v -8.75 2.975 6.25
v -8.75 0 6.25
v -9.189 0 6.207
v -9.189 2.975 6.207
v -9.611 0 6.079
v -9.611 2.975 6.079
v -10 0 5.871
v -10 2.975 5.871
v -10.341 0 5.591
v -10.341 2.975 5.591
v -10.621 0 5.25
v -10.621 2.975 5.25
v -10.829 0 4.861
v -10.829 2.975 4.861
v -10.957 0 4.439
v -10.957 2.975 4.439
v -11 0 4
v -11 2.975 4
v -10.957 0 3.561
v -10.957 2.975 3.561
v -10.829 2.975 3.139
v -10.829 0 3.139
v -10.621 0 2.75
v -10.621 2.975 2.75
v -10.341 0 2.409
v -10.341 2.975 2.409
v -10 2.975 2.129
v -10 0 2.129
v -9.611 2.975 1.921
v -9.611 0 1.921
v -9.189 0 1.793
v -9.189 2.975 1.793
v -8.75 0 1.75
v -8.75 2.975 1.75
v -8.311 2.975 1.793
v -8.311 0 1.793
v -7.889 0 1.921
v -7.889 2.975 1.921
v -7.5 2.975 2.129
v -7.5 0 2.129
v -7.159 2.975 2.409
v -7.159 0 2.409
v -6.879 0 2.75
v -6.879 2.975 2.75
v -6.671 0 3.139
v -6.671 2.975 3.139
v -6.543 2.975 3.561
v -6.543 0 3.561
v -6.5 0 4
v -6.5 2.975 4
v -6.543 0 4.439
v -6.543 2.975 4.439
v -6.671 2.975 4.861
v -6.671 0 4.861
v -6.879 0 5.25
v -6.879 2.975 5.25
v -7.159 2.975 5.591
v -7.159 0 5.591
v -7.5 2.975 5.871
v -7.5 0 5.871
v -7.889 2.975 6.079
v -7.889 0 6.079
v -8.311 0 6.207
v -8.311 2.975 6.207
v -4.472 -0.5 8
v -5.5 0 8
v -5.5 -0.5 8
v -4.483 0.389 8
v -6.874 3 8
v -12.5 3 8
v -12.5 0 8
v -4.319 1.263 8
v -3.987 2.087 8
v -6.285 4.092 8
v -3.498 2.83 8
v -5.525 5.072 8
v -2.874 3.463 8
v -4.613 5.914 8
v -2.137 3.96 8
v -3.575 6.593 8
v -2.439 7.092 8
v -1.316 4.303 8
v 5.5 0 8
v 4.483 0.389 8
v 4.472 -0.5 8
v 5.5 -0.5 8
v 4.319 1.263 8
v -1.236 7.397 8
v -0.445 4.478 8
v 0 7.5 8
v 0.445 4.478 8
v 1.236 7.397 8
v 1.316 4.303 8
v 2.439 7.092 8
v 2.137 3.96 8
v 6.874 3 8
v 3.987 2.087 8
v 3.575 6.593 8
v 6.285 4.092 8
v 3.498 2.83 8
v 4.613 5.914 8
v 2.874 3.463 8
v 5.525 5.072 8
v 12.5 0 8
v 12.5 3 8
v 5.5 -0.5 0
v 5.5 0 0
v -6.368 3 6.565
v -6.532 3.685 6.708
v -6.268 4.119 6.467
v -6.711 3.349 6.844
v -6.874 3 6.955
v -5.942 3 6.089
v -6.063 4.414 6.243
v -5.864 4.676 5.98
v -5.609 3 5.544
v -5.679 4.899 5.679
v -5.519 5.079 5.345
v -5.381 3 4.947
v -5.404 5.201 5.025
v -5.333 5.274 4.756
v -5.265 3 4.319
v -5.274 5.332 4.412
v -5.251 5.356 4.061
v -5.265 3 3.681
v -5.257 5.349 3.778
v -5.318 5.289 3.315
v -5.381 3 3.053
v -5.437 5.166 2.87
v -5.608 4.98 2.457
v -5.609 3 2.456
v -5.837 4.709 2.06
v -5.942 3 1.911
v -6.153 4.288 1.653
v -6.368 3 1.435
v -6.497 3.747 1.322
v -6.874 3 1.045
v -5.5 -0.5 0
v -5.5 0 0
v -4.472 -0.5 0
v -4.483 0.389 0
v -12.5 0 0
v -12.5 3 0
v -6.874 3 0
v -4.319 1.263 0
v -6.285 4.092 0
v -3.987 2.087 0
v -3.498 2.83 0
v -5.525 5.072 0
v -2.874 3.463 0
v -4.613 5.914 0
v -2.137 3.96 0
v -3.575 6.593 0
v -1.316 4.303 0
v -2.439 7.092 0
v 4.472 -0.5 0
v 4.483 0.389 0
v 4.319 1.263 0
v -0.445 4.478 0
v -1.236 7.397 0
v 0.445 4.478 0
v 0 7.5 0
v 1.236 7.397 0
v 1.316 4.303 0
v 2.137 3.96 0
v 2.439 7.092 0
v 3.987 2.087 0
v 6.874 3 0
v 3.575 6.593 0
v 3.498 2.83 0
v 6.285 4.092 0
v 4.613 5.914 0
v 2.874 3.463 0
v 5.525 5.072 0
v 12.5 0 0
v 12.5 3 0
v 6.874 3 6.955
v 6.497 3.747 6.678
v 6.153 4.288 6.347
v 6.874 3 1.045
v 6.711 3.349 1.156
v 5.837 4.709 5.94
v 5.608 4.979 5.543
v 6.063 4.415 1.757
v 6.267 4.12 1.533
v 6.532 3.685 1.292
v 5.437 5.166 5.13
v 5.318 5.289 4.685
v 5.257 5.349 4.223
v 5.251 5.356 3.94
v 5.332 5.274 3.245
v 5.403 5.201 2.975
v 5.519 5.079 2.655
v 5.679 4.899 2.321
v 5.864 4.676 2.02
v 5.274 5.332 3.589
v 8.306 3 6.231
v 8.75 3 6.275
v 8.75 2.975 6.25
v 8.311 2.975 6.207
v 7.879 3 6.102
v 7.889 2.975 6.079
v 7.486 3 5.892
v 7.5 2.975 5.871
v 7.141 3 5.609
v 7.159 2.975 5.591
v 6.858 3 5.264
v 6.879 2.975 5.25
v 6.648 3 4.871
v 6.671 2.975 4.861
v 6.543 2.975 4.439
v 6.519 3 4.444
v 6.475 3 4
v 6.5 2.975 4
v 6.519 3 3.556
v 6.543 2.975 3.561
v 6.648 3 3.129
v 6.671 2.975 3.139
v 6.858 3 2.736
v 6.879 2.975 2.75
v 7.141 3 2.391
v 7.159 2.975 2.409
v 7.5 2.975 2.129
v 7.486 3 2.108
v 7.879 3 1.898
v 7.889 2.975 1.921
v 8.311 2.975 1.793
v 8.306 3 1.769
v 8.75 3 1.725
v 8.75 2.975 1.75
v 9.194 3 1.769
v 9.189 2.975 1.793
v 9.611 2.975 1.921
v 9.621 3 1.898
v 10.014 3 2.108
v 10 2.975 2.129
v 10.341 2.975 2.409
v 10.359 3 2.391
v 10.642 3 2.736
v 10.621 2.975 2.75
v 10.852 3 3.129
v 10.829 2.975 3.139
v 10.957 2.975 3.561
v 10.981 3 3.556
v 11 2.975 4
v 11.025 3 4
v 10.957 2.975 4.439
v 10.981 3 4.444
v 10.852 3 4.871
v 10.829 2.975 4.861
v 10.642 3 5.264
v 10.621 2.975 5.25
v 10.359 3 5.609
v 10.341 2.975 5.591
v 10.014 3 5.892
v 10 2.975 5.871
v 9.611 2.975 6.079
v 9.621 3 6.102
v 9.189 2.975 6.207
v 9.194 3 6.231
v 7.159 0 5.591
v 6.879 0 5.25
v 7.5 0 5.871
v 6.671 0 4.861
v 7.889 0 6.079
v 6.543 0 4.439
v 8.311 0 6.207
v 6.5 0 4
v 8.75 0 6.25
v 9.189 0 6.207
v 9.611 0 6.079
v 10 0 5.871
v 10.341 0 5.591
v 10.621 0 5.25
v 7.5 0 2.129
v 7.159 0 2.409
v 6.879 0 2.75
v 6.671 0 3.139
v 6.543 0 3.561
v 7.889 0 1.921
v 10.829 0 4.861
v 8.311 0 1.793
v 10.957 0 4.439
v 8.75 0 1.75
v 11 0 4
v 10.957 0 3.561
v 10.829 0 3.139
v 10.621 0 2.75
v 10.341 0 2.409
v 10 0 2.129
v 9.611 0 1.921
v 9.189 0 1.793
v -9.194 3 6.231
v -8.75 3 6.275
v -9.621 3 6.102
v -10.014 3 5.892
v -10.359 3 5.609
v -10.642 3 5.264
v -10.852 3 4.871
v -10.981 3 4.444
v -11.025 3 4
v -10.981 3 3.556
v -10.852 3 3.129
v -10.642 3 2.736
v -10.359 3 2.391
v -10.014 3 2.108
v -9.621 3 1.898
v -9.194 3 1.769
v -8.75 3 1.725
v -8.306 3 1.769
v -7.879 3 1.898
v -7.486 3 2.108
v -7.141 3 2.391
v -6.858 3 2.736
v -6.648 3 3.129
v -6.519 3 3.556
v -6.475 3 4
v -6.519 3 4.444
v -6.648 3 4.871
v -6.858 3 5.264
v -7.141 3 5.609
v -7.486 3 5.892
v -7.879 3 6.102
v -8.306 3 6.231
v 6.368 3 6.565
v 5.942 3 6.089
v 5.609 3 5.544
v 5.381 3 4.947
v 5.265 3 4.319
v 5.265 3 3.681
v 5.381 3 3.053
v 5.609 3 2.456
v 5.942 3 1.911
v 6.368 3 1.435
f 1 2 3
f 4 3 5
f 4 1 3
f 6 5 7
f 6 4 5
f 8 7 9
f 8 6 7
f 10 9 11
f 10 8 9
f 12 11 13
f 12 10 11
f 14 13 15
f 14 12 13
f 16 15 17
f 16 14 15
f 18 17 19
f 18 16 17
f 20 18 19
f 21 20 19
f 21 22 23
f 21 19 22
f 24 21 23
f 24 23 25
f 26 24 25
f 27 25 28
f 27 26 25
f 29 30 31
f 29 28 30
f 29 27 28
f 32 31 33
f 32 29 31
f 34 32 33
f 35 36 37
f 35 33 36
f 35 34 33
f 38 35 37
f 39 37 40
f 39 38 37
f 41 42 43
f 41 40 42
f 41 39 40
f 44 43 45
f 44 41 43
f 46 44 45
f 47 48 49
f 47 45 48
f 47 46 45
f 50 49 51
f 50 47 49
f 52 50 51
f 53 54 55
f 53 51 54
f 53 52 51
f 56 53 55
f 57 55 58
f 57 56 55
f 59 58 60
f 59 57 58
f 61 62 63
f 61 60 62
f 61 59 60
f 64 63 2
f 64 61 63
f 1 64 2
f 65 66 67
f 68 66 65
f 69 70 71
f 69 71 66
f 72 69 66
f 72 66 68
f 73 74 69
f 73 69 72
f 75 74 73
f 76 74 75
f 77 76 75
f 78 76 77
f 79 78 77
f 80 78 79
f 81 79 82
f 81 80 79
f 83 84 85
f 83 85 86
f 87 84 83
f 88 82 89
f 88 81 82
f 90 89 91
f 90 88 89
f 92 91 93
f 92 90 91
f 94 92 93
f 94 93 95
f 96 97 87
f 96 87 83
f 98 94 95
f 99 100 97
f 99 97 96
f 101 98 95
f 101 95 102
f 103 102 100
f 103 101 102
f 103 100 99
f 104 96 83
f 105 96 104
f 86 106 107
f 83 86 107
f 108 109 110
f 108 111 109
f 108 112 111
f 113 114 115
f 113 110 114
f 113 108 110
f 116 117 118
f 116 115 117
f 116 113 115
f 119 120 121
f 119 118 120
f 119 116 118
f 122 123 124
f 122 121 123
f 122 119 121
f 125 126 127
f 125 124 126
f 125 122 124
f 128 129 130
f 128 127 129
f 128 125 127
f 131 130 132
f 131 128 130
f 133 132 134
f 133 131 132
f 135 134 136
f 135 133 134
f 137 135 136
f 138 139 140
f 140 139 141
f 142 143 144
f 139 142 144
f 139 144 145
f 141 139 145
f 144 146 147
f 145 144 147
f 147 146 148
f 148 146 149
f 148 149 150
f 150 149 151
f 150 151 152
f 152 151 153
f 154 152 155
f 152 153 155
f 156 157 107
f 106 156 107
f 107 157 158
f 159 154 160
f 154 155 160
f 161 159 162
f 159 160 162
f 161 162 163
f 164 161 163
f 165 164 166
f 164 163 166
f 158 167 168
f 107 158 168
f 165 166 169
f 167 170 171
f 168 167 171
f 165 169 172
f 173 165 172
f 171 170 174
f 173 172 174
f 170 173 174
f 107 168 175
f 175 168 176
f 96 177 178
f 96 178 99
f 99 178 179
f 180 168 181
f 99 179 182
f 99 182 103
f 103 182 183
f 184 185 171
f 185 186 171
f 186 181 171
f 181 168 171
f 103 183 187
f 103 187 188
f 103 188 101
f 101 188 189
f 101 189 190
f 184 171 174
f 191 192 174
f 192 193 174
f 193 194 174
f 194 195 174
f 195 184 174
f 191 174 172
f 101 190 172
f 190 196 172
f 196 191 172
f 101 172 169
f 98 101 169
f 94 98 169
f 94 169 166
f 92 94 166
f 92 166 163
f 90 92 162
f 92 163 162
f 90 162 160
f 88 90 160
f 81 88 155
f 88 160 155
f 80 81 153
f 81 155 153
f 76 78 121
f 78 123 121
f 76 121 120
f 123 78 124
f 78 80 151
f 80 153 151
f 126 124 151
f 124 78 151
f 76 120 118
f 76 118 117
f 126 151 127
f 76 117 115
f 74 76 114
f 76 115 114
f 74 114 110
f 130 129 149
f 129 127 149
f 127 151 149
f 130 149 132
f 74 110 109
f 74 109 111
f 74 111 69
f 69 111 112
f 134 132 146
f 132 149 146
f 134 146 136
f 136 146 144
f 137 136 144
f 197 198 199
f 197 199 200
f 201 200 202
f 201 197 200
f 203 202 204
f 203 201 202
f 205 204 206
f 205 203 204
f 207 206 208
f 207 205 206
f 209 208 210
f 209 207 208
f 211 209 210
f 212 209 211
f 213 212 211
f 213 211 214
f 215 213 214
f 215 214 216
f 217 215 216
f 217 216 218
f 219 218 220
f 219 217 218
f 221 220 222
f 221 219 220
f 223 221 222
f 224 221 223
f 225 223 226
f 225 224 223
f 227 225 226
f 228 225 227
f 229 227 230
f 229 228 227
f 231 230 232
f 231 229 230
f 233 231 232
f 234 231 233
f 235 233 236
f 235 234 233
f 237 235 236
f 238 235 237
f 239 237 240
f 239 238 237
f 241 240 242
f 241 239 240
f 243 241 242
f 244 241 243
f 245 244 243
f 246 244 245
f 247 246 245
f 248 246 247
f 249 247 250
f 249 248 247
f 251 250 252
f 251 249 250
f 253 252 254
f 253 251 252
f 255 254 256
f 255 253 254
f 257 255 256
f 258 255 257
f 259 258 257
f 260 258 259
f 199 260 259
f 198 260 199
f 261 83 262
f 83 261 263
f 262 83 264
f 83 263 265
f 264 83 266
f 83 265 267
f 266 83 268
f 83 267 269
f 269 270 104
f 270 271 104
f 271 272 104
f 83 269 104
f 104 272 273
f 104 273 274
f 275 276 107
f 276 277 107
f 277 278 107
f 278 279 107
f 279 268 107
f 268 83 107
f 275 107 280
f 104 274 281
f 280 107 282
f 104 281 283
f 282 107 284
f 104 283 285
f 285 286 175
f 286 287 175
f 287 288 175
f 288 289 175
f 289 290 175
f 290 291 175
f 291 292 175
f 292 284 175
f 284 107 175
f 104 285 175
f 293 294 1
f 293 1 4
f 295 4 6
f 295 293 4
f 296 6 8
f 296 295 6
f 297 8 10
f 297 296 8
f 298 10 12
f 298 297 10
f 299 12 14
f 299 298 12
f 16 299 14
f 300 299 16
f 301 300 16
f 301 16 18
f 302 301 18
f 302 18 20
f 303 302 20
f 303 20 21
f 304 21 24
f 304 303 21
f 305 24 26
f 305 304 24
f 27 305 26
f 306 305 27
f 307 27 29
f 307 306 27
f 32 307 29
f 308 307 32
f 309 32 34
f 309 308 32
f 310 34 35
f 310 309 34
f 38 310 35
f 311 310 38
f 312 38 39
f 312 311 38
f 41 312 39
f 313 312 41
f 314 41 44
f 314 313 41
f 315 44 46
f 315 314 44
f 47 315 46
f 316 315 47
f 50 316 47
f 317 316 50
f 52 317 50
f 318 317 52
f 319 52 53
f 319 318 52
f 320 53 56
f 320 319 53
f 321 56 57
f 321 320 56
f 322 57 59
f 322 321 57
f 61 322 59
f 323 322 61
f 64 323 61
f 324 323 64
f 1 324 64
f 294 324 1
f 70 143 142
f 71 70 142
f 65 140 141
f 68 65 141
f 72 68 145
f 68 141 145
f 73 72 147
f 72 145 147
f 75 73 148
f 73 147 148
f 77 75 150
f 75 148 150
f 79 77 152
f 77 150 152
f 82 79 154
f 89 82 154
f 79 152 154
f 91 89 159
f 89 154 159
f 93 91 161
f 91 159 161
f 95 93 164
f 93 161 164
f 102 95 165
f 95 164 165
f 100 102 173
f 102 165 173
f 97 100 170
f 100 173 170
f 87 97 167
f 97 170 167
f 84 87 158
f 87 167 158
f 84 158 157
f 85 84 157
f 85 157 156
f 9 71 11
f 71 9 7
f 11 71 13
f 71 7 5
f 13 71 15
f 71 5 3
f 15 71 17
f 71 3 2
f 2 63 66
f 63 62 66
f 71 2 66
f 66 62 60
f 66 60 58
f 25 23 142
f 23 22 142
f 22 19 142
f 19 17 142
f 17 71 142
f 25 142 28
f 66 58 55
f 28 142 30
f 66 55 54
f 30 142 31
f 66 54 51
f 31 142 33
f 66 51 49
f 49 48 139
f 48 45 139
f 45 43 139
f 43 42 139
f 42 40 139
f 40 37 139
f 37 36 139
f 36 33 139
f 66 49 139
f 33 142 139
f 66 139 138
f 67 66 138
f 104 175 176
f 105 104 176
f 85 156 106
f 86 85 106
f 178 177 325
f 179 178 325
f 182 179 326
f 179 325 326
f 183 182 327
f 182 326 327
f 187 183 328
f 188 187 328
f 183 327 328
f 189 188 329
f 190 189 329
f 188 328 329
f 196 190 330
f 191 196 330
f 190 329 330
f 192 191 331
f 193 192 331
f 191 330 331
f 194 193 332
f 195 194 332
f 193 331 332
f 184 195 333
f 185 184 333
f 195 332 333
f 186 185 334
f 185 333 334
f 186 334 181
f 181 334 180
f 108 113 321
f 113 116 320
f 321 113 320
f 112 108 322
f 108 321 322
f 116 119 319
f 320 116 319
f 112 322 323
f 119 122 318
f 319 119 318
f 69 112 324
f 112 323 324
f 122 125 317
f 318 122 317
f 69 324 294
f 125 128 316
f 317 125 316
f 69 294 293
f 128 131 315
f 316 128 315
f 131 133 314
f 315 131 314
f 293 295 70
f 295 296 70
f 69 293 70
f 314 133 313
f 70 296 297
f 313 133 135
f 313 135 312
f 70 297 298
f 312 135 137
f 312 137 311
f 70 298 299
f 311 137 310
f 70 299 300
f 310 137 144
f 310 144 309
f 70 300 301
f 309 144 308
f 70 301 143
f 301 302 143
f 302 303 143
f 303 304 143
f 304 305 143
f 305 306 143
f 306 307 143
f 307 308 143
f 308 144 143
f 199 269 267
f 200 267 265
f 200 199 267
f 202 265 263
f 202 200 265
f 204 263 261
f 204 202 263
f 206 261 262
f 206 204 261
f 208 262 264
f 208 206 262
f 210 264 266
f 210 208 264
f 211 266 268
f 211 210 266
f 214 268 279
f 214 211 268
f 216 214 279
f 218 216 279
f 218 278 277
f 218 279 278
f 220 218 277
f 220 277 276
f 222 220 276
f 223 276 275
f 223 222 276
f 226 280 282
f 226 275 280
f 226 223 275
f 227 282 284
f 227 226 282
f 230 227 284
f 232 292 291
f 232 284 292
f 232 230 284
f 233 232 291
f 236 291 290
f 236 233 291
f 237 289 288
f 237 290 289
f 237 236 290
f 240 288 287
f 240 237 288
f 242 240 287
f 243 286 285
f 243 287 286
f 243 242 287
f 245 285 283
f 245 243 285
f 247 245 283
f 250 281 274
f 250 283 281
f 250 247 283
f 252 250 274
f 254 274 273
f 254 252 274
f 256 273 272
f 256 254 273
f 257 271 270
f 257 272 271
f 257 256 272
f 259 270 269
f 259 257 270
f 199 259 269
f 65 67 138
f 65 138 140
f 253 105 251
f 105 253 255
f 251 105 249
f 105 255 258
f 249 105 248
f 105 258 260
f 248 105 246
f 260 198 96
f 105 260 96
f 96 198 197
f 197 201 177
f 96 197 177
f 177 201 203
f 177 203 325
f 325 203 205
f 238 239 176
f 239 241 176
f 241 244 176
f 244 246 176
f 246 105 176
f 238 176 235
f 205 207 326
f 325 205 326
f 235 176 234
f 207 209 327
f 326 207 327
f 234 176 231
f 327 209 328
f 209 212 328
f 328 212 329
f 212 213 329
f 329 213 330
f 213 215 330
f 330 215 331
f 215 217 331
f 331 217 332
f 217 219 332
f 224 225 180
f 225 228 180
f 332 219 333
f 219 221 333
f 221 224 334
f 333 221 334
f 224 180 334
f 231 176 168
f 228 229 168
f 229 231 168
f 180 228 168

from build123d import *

# Parameters (mm, degrees)
EXTRUDE_1_DEPTH             = 8
HOLE_WIZARD_M4_1_AT_2_COUNT = 2
HOLE_WIZARD_M4_1_AT_2_PITCH = 17.5
EXTRUDE_START               = -4
EXTRUDE_3_DEPTH             = 4
SKETCH_7_R                  = 4.5
CUT_EXTRUDE_1_DEPTH         = 1
SKETCH_8_R                  = 3.5
CUT_EXTRUDE_2_DEPTH         = 10
SKETCH_10_R                 = 4.5
CUT_EXTRUDE_3_DEPTH         = 17.170961718


with BuildPart() as part:
    # 草图1 → 凸台-拉伸1 (new body)
    with BuildSketch(Plane.XY):
        with BuildLine():
            Line((5.5, 0), (12.5, 0))
            Line((12.5, 0), (12.5, 3))
            Line((12.5, 3), (6.873863542, 3))
            ThreePointArc((6.873863542, 3), (0, 7.5), (-6.873863542, 3))
            Line((-6.873863542, 3), (-12.5, 3))
            Line((-12.5, 3), (-12.5, 0))
            Line((-12.5, 0), (-5.5, 0))
            Line((-5.5, 0), (-5.5, -0.5))
            Line((-5.5, -0.5), (-4.00894001, -0.5))
            ThreePointArc((-4.00894001, -0.5), (0, 4.04), (4.00894001, -0.5))
            Line((4.00894001, -0.5), (5.5, -0.5))
            Line((5.5, -0.5), (5.5, 0))
        make_face()
    extrude(amount=EXTRUDE_1_DEPTH)

    # 草图5 → M4 间隙孔1 (revolve, cut)
    with BuildSketch(Plane(origin=(-8.75, 3, 4), x_dir=(0, 0, 1), z_dir=(1, 0, 0))):
        Polygon((0, 0), (0, 4.501936393), (2.25, 3.15), (2.25, 0.025), (2.275, 0), align=None)
    hole_wizard_m4_1 = revolve(axis=Axis((-8.75, 9.35, 4), (0, -1, 0)), mode=Mode.SUBTRACT)

    # M4 间隙孔1 at 2: M4 间隙孔1 ×2
    with Locations(*[(i * HOLE_WIZARD_M4_1_AT_2_PITCH, 0, 0) for i in range(1, HOLE_WIZARD_M4_1_AT_2_COUNT)]):
        add(hole_wizard_m4_1, mode=Mode.SUBTRACT)

    # 草图6 → 凸台-拉伸3 (add)
    with BuildSketch(Plane.XY.offset(8).offset(EXTRUDE_START)):
        with BuildLine():
            Line((-4.00894001, -0.5), (-3.464101615, -0.5))
            ThreePointArc((-3.464101615, -0.5), (0, 3.5), (3.464101615, -0.5))
            Line((3.464101615, -0.5), (4.00894001, -0.5))
            ThreePointArc((4.00894001, -0.5), (0, 4.04), (-4.00894001, -0.5))
        make_face()
    extrude(amount=EXTRUDE_3_DEPTH)

    # 草图7 → 切除-拉伸1 (cut)
    with BuildSketch(Plane(origin=(0, 0, 0), x_dir=(-1, 0, 0), z_dir=(0, 0, -1))):
        Circle(SKETCH_7_R)
    extrude(amount=-CUT_EXTRUDE_1_DEPTH, mode=Mode.SUBTRACT)

    # 草图8 → 切除-拉伸2 (cut)
    with BuildSketch(Plane(origin=(0, 3, 0), x_dir=(1, 0, 0), z_dir=(0, 1, 0))):
        with Locations((-8.75, -4)):
            Circle(SKETCH_8_R)
    cut_extrude_2 = extrude(amount=CUT_EXTRUDE_2_DEPTH, mode=Mode.SUBTRACT)

    # 镜向1: 切除-拉伸2 across plane
    add(cut_extrude_2.mirror(Plane(origin=(0, 0, 0), x_dir=(0, 0, 1), z_dir=(1, 0, 0))), mode=Mode.SUBTRACT)

    # 草图10 → 切除-拉伸3 (cut, through all)
    with BuildSketch(Plane(origin=(0, 0, 1), x_dir=(-1, 0, 0), z_dir=(0, 0, -1))):
        Circle(SKETCH_10_R)
    extrude(amount=-CUT_EXTRUDE_3_DEPTH, mode=Mode.SUBTRACT)


solid = part.part
